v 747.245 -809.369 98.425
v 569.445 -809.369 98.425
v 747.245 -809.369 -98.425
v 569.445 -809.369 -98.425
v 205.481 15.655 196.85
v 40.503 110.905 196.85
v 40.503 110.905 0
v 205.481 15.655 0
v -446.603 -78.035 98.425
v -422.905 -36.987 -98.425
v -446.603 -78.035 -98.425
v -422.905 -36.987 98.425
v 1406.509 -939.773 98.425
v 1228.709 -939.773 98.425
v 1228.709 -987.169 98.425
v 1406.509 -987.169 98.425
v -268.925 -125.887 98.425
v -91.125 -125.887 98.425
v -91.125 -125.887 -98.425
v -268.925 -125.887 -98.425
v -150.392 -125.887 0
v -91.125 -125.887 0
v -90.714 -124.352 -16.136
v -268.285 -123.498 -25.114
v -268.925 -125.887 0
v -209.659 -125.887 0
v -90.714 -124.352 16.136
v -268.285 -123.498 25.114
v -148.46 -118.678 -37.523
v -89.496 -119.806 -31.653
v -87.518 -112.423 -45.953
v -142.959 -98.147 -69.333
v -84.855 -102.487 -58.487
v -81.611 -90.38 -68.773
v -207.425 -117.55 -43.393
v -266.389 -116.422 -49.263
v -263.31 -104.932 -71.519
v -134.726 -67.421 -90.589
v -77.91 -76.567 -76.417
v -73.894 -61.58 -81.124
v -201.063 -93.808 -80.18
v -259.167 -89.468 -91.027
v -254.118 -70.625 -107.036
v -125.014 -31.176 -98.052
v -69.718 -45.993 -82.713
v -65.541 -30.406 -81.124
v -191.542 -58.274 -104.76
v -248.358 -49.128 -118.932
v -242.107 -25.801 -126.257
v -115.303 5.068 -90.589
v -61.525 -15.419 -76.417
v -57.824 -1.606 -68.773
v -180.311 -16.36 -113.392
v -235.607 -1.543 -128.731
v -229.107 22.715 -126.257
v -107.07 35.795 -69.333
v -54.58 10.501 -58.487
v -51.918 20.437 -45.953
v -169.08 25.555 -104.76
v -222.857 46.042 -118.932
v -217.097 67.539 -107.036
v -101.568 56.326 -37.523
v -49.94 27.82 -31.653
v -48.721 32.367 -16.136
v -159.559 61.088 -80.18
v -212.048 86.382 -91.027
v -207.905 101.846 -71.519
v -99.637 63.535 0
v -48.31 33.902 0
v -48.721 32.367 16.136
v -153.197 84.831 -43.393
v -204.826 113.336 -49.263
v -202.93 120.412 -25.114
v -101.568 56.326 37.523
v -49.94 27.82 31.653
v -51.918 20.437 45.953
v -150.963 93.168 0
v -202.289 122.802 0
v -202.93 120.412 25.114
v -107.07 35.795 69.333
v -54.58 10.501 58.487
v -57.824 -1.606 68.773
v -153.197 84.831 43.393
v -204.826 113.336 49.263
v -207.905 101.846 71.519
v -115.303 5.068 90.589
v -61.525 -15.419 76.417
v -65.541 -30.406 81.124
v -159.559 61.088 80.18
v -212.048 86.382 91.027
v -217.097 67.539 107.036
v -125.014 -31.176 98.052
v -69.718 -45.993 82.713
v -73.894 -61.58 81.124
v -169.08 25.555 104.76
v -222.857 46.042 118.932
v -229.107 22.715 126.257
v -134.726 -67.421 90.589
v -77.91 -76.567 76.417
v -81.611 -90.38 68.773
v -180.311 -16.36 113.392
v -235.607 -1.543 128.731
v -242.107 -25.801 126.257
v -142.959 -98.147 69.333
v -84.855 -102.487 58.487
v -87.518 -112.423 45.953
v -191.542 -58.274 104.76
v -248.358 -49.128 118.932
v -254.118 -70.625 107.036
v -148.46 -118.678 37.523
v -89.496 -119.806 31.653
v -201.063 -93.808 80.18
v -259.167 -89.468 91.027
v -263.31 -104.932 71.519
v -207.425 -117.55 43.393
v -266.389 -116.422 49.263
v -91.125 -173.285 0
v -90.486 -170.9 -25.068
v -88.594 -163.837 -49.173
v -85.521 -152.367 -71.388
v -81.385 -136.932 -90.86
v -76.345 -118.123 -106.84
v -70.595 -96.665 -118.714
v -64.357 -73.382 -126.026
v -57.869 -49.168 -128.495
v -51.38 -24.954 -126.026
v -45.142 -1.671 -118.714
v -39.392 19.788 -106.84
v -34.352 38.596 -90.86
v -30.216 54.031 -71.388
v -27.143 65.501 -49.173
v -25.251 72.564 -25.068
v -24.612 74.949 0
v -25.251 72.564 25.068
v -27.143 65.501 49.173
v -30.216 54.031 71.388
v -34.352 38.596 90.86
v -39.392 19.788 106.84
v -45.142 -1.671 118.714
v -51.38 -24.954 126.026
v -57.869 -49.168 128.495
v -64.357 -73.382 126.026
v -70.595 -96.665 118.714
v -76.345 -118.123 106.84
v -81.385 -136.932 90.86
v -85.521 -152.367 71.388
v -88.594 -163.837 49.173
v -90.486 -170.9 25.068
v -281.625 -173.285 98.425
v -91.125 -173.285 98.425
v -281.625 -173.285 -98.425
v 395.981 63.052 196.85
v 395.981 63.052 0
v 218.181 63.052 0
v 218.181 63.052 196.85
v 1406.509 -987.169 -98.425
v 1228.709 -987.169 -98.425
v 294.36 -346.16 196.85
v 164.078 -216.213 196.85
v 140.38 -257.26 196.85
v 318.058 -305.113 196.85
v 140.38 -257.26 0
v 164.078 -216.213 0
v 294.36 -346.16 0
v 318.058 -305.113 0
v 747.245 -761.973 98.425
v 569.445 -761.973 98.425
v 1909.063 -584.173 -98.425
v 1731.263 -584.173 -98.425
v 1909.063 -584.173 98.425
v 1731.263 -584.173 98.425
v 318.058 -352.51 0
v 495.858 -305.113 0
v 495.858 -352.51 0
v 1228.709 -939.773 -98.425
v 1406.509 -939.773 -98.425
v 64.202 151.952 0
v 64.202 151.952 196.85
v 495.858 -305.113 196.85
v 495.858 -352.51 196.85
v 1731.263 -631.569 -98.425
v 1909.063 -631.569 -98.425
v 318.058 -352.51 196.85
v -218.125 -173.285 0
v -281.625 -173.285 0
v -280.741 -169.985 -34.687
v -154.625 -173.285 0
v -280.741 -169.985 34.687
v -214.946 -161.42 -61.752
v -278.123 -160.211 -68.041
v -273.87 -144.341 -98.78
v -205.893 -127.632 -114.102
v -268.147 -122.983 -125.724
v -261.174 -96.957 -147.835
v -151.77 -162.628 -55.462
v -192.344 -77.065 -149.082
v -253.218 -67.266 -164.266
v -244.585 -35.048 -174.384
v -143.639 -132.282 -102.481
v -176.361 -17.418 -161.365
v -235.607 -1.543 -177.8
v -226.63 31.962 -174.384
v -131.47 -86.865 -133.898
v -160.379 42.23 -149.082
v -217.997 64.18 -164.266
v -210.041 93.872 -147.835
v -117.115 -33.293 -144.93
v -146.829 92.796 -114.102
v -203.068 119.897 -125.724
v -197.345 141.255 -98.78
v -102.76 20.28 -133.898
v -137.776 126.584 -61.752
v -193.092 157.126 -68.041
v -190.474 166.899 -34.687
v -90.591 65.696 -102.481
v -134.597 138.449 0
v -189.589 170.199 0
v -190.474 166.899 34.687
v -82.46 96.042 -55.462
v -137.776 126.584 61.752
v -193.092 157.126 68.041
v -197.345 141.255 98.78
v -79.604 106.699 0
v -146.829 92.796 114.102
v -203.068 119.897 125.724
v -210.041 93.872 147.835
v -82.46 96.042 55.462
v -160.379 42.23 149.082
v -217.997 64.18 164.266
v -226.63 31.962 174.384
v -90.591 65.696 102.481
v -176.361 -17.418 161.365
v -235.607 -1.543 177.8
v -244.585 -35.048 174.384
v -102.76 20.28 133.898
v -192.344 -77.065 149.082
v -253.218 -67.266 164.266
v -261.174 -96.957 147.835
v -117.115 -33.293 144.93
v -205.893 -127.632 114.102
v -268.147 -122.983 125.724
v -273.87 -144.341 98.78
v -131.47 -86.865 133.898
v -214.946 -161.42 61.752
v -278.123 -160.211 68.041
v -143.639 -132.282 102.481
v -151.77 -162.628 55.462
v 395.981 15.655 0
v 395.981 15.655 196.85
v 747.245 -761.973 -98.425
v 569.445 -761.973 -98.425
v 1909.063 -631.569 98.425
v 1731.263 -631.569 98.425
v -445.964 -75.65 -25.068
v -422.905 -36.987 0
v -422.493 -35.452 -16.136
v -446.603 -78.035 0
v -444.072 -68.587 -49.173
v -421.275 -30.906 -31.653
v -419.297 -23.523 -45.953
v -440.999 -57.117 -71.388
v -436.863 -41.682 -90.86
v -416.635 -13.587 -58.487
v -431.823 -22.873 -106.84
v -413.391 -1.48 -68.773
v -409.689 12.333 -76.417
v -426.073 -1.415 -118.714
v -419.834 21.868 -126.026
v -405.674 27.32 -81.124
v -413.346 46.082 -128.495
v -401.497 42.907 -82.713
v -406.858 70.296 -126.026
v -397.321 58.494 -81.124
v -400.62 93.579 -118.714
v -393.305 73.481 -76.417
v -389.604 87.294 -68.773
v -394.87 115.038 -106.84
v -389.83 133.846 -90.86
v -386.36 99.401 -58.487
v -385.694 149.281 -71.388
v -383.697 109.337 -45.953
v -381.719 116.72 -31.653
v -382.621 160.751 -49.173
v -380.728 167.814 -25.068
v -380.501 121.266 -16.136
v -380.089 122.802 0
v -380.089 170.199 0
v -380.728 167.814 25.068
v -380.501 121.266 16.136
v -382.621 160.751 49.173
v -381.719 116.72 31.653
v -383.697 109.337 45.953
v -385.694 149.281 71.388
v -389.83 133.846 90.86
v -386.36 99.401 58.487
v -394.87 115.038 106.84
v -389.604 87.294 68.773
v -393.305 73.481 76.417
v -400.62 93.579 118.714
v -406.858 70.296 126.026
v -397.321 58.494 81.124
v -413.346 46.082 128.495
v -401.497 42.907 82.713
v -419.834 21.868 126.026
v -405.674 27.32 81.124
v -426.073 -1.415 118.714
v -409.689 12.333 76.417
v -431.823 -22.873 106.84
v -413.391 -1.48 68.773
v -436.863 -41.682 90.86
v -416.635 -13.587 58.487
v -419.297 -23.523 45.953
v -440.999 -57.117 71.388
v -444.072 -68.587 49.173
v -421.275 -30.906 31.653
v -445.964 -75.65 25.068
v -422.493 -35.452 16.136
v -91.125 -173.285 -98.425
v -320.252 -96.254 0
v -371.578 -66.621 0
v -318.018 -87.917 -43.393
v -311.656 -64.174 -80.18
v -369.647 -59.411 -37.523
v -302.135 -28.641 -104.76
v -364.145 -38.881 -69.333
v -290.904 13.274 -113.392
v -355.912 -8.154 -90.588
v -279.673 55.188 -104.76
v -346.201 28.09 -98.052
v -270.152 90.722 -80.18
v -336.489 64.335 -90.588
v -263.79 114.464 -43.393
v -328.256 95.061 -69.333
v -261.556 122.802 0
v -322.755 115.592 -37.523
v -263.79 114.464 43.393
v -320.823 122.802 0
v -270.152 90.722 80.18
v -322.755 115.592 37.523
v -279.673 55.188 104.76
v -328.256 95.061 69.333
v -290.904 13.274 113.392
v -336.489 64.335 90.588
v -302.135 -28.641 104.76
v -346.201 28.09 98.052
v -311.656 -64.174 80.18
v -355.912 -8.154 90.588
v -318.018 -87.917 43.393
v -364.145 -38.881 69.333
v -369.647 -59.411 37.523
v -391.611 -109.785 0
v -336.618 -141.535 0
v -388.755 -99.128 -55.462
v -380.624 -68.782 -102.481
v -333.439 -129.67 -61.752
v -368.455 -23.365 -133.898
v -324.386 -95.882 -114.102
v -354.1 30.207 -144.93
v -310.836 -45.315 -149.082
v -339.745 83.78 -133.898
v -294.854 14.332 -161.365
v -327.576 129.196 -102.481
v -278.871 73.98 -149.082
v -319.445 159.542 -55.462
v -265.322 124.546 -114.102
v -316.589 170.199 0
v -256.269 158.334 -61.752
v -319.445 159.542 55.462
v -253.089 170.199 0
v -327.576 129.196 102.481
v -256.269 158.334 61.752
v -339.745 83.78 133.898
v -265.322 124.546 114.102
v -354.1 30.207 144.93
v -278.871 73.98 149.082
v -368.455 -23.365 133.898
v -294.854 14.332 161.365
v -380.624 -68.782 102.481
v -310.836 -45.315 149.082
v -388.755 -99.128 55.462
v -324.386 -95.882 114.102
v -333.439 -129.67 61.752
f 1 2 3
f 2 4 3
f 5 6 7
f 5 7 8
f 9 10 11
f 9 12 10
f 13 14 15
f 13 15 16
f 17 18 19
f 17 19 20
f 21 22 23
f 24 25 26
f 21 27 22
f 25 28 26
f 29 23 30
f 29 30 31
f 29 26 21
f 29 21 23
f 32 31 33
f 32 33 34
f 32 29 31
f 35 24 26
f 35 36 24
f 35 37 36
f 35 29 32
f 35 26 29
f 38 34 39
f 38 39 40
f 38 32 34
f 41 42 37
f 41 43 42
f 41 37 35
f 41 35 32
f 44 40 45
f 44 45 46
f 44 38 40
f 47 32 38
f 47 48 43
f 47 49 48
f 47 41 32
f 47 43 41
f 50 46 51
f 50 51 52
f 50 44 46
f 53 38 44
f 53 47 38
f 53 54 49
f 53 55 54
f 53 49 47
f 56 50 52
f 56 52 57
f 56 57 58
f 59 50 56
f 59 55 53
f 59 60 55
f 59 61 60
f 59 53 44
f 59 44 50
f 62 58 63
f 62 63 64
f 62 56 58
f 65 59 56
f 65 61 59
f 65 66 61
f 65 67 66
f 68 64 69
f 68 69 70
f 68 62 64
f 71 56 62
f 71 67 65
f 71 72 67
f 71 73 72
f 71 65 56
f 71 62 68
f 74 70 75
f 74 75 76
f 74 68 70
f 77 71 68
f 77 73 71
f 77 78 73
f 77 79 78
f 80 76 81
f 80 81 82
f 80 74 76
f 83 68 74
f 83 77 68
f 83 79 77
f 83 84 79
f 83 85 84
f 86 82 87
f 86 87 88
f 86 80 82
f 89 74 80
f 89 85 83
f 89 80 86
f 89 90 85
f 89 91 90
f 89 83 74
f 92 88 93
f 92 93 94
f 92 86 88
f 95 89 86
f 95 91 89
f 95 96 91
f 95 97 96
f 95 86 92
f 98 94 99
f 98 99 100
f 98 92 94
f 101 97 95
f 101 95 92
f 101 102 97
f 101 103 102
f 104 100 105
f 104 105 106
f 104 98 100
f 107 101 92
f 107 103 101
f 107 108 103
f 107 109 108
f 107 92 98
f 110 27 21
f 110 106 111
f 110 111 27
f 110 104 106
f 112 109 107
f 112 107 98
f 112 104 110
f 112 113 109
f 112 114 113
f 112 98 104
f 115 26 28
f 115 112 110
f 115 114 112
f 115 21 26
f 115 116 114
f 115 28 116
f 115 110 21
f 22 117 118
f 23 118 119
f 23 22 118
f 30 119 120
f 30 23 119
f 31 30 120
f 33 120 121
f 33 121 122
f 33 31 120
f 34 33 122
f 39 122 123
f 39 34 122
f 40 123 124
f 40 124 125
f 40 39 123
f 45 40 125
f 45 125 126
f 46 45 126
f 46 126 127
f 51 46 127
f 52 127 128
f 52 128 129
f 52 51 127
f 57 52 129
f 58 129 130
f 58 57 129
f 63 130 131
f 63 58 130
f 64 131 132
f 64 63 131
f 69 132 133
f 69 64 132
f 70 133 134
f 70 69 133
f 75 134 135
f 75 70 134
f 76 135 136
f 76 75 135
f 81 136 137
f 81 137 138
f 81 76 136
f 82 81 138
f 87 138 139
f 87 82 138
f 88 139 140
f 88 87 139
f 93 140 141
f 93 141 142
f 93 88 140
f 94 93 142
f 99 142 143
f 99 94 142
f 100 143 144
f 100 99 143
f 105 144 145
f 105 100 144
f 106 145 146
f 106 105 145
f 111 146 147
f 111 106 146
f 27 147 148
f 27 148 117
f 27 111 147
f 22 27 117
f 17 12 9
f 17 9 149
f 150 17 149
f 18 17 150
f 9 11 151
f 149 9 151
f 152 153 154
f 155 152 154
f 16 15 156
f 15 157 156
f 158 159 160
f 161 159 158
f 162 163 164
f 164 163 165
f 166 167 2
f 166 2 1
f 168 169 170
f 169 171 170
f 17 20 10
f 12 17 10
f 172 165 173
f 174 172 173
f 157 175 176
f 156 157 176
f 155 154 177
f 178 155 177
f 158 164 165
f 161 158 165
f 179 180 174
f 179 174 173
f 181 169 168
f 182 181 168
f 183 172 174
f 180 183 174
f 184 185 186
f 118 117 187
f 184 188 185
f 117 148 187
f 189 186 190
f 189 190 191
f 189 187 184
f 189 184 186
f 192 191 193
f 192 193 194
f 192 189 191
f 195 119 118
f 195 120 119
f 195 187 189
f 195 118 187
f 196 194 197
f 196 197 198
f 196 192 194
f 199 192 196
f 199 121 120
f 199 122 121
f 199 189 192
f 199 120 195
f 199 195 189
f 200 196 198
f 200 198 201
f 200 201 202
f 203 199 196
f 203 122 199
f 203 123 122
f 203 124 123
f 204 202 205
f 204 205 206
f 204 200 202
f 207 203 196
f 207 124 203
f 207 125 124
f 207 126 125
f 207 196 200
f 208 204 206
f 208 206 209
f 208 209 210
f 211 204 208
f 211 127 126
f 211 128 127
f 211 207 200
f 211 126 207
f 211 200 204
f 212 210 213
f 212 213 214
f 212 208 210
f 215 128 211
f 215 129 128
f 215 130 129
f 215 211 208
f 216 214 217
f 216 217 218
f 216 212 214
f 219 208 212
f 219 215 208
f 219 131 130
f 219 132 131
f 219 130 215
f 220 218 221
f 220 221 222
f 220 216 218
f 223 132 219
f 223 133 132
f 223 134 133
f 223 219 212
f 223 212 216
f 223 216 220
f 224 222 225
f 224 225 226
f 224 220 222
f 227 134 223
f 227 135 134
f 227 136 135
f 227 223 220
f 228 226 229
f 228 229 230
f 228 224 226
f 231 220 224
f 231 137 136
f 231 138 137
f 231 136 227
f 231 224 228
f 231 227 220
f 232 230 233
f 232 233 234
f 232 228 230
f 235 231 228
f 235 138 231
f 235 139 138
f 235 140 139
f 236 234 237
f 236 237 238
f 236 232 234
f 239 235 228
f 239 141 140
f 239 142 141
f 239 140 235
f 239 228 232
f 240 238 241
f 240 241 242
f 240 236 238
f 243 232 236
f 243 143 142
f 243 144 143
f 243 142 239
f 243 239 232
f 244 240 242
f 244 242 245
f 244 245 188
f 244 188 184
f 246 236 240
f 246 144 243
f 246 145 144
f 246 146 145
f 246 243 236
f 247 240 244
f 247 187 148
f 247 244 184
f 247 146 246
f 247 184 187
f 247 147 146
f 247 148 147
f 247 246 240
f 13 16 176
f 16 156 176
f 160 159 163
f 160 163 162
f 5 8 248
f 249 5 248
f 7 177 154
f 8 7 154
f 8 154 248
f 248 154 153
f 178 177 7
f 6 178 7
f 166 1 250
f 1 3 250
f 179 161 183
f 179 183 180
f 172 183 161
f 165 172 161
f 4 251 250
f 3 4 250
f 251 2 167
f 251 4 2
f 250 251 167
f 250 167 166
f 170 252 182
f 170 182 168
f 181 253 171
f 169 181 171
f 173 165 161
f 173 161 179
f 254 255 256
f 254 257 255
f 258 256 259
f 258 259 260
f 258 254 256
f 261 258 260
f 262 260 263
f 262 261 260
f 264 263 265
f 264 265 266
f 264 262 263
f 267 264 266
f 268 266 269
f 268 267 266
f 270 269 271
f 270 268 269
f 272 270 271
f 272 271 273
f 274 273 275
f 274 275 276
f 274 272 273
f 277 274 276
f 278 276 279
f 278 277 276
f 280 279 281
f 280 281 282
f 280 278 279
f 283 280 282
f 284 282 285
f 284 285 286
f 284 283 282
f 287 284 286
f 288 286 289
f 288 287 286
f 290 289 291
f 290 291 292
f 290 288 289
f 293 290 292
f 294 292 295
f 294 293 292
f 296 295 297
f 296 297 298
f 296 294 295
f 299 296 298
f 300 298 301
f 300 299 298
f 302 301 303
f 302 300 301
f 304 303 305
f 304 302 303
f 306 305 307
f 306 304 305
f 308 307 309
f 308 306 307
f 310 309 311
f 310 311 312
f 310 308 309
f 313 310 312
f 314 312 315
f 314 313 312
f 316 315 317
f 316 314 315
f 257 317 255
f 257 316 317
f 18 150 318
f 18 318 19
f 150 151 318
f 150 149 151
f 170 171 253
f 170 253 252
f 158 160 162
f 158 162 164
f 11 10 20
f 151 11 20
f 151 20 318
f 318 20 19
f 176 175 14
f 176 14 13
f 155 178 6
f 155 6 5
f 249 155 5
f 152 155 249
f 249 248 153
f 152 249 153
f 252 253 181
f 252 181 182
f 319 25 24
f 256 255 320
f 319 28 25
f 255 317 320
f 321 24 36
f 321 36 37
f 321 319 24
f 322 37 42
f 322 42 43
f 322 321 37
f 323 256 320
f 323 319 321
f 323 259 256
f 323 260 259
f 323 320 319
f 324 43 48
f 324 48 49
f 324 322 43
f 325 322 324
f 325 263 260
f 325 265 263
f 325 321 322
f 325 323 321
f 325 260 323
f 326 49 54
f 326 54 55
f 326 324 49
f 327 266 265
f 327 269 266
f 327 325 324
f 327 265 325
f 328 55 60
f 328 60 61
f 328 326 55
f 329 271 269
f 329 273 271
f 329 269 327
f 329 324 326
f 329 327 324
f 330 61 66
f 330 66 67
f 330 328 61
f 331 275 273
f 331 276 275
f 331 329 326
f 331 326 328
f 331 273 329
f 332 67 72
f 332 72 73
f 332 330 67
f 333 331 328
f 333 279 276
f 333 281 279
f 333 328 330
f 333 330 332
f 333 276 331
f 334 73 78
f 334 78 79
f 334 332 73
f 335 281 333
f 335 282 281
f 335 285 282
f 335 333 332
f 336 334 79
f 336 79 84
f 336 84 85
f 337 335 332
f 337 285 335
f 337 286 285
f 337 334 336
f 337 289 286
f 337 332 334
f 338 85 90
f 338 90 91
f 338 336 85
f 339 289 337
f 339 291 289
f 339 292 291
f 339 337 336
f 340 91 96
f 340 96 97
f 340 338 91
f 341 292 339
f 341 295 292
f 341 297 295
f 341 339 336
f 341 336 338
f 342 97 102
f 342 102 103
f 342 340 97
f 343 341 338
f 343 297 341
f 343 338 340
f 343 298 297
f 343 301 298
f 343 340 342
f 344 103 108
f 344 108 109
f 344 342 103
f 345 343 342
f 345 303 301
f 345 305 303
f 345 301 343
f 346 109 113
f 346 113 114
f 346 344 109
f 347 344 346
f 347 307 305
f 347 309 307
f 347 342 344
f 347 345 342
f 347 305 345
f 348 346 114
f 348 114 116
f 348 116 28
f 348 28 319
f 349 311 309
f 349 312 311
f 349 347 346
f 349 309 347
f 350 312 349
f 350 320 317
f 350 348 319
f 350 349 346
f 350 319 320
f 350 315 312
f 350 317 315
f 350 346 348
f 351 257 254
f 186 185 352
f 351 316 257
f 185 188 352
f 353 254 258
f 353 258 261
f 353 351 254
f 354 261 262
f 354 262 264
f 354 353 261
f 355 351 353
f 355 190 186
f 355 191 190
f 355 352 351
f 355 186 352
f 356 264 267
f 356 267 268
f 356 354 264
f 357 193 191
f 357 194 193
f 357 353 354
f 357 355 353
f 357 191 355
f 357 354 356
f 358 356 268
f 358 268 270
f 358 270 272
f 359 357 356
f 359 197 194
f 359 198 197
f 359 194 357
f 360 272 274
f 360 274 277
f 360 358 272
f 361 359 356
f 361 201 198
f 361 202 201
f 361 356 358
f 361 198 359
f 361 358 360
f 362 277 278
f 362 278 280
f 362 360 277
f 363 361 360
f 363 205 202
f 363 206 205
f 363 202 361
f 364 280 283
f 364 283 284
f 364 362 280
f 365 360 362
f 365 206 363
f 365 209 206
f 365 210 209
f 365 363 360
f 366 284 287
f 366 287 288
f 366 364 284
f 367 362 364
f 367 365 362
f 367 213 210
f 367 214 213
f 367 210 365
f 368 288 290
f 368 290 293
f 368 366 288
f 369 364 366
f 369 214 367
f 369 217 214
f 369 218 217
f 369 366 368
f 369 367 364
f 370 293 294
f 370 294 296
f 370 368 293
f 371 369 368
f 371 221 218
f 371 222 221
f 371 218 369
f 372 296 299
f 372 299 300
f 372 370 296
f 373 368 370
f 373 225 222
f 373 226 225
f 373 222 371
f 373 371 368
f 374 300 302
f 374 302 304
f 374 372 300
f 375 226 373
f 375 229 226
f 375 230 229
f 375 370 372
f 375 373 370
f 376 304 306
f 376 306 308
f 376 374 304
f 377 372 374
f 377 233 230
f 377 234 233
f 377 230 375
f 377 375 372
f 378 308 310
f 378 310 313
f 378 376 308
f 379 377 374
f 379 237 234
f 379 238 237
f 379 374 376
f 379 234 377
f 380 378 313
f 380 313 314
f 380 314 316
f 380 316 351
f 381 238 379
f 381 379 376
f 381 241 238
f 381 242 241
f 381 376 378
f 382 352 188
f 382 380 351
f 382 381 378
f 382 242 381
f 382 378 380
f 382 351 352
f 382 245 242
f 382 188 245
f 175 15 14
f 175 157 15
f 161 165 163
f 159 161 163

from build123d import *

# Parameters (mm, degrees)
F1_DEPTH = 196.85
F0_W     = 177.8
F0_H     = 47.3964
F3_DEPTH = 196.85
F4_W     = 177.8
F4_H     = 47.3964
F5_DEPTH = 98.425
F6_DEPTH = 98.425


with BuildPart() as f1:
    # F0 (on Top) → F1 (new body)
    with BuildSketch(Plane.XY):
        Polygon((218.18133, 63.052272), (205.48133, 15.655227), (395.98133, 15.655227), (395.98133, 63.052272), align=None)
        Polygon((40.503491, 110.905227), (205.48133, 15.655227), (218.18133, 63.052272), (64.202014, 151.952272), align=None)
    extrude(amount=F1_DEPTH)


with BuildPart() as f2:
    # F0 (on Top) → F2 (revolve)
    with BuildSketch(Plane.XY):
        Polygon((-446.603314, -78.034535), (-281.625475, -173.284535), (-268.925475, -125.88749), (-422.904791, -36.98749), align=None)
        Polygon((-268.925475, -125.88749), (-281.625475, -173.284535), (-91.125475, -173.284535), (-91.125475, -125.88749), align=None)
    revolve(axis=Axis((-189.536265, -13.88766, 0), (0.965926, -0.258819, 0)))


with BuildPart() as f3:
    # F0 (on Top) → F3 (new body)
    with BuildSketch(Plane.XY):
        Polygon((294.359544, -346.15975), (318.057744, -305.113264), (164.078428, -216.213264), (140.380228, -257.25975), align=None)
        with Locations((406.957744, -328.811464)):
            Rectangle(F0_W, F0_H)
    extrude(amount=F3_DEPTH)


with BuildPart() as f5:
    # F4 (on Top) → F5 (new body, symmetric)
    with BuildSketch(Plane.XY):
        with Locations((1317.60931, -963.471294)):
            Rectangle(F4_W, F4_H)
        with Locations((658.344746, -785.671294)):
            Rectangle(F4_W, F4_H)
        with Locations((1820.16325, -607.871294)):
            Rectangle(F4_W, F4_H)
    extrude(amount=F5_DEPTH, both=True)


with BuildPart() as f6:
    # F0 (on Top) → F6 (new body, symmetric)
    with BuildSketch(Plane.XY):
        Polygon((-268.925475, -125.88749), (-281.625475, -173.284535), (-91.125475, -173.284535), (-91.125475, -125.88749), align=None)
        Polygon((-446.603314, -78.034535), (-281.625475, -173.284535), (-268.925475, -125.88749), (-422.904791, -36.98749), align=None)
    extrude(amount=F6_DEPTH, both=True)


solid = Compound([f1.part, f2.part, f3.part, f5.part, f6.part])
